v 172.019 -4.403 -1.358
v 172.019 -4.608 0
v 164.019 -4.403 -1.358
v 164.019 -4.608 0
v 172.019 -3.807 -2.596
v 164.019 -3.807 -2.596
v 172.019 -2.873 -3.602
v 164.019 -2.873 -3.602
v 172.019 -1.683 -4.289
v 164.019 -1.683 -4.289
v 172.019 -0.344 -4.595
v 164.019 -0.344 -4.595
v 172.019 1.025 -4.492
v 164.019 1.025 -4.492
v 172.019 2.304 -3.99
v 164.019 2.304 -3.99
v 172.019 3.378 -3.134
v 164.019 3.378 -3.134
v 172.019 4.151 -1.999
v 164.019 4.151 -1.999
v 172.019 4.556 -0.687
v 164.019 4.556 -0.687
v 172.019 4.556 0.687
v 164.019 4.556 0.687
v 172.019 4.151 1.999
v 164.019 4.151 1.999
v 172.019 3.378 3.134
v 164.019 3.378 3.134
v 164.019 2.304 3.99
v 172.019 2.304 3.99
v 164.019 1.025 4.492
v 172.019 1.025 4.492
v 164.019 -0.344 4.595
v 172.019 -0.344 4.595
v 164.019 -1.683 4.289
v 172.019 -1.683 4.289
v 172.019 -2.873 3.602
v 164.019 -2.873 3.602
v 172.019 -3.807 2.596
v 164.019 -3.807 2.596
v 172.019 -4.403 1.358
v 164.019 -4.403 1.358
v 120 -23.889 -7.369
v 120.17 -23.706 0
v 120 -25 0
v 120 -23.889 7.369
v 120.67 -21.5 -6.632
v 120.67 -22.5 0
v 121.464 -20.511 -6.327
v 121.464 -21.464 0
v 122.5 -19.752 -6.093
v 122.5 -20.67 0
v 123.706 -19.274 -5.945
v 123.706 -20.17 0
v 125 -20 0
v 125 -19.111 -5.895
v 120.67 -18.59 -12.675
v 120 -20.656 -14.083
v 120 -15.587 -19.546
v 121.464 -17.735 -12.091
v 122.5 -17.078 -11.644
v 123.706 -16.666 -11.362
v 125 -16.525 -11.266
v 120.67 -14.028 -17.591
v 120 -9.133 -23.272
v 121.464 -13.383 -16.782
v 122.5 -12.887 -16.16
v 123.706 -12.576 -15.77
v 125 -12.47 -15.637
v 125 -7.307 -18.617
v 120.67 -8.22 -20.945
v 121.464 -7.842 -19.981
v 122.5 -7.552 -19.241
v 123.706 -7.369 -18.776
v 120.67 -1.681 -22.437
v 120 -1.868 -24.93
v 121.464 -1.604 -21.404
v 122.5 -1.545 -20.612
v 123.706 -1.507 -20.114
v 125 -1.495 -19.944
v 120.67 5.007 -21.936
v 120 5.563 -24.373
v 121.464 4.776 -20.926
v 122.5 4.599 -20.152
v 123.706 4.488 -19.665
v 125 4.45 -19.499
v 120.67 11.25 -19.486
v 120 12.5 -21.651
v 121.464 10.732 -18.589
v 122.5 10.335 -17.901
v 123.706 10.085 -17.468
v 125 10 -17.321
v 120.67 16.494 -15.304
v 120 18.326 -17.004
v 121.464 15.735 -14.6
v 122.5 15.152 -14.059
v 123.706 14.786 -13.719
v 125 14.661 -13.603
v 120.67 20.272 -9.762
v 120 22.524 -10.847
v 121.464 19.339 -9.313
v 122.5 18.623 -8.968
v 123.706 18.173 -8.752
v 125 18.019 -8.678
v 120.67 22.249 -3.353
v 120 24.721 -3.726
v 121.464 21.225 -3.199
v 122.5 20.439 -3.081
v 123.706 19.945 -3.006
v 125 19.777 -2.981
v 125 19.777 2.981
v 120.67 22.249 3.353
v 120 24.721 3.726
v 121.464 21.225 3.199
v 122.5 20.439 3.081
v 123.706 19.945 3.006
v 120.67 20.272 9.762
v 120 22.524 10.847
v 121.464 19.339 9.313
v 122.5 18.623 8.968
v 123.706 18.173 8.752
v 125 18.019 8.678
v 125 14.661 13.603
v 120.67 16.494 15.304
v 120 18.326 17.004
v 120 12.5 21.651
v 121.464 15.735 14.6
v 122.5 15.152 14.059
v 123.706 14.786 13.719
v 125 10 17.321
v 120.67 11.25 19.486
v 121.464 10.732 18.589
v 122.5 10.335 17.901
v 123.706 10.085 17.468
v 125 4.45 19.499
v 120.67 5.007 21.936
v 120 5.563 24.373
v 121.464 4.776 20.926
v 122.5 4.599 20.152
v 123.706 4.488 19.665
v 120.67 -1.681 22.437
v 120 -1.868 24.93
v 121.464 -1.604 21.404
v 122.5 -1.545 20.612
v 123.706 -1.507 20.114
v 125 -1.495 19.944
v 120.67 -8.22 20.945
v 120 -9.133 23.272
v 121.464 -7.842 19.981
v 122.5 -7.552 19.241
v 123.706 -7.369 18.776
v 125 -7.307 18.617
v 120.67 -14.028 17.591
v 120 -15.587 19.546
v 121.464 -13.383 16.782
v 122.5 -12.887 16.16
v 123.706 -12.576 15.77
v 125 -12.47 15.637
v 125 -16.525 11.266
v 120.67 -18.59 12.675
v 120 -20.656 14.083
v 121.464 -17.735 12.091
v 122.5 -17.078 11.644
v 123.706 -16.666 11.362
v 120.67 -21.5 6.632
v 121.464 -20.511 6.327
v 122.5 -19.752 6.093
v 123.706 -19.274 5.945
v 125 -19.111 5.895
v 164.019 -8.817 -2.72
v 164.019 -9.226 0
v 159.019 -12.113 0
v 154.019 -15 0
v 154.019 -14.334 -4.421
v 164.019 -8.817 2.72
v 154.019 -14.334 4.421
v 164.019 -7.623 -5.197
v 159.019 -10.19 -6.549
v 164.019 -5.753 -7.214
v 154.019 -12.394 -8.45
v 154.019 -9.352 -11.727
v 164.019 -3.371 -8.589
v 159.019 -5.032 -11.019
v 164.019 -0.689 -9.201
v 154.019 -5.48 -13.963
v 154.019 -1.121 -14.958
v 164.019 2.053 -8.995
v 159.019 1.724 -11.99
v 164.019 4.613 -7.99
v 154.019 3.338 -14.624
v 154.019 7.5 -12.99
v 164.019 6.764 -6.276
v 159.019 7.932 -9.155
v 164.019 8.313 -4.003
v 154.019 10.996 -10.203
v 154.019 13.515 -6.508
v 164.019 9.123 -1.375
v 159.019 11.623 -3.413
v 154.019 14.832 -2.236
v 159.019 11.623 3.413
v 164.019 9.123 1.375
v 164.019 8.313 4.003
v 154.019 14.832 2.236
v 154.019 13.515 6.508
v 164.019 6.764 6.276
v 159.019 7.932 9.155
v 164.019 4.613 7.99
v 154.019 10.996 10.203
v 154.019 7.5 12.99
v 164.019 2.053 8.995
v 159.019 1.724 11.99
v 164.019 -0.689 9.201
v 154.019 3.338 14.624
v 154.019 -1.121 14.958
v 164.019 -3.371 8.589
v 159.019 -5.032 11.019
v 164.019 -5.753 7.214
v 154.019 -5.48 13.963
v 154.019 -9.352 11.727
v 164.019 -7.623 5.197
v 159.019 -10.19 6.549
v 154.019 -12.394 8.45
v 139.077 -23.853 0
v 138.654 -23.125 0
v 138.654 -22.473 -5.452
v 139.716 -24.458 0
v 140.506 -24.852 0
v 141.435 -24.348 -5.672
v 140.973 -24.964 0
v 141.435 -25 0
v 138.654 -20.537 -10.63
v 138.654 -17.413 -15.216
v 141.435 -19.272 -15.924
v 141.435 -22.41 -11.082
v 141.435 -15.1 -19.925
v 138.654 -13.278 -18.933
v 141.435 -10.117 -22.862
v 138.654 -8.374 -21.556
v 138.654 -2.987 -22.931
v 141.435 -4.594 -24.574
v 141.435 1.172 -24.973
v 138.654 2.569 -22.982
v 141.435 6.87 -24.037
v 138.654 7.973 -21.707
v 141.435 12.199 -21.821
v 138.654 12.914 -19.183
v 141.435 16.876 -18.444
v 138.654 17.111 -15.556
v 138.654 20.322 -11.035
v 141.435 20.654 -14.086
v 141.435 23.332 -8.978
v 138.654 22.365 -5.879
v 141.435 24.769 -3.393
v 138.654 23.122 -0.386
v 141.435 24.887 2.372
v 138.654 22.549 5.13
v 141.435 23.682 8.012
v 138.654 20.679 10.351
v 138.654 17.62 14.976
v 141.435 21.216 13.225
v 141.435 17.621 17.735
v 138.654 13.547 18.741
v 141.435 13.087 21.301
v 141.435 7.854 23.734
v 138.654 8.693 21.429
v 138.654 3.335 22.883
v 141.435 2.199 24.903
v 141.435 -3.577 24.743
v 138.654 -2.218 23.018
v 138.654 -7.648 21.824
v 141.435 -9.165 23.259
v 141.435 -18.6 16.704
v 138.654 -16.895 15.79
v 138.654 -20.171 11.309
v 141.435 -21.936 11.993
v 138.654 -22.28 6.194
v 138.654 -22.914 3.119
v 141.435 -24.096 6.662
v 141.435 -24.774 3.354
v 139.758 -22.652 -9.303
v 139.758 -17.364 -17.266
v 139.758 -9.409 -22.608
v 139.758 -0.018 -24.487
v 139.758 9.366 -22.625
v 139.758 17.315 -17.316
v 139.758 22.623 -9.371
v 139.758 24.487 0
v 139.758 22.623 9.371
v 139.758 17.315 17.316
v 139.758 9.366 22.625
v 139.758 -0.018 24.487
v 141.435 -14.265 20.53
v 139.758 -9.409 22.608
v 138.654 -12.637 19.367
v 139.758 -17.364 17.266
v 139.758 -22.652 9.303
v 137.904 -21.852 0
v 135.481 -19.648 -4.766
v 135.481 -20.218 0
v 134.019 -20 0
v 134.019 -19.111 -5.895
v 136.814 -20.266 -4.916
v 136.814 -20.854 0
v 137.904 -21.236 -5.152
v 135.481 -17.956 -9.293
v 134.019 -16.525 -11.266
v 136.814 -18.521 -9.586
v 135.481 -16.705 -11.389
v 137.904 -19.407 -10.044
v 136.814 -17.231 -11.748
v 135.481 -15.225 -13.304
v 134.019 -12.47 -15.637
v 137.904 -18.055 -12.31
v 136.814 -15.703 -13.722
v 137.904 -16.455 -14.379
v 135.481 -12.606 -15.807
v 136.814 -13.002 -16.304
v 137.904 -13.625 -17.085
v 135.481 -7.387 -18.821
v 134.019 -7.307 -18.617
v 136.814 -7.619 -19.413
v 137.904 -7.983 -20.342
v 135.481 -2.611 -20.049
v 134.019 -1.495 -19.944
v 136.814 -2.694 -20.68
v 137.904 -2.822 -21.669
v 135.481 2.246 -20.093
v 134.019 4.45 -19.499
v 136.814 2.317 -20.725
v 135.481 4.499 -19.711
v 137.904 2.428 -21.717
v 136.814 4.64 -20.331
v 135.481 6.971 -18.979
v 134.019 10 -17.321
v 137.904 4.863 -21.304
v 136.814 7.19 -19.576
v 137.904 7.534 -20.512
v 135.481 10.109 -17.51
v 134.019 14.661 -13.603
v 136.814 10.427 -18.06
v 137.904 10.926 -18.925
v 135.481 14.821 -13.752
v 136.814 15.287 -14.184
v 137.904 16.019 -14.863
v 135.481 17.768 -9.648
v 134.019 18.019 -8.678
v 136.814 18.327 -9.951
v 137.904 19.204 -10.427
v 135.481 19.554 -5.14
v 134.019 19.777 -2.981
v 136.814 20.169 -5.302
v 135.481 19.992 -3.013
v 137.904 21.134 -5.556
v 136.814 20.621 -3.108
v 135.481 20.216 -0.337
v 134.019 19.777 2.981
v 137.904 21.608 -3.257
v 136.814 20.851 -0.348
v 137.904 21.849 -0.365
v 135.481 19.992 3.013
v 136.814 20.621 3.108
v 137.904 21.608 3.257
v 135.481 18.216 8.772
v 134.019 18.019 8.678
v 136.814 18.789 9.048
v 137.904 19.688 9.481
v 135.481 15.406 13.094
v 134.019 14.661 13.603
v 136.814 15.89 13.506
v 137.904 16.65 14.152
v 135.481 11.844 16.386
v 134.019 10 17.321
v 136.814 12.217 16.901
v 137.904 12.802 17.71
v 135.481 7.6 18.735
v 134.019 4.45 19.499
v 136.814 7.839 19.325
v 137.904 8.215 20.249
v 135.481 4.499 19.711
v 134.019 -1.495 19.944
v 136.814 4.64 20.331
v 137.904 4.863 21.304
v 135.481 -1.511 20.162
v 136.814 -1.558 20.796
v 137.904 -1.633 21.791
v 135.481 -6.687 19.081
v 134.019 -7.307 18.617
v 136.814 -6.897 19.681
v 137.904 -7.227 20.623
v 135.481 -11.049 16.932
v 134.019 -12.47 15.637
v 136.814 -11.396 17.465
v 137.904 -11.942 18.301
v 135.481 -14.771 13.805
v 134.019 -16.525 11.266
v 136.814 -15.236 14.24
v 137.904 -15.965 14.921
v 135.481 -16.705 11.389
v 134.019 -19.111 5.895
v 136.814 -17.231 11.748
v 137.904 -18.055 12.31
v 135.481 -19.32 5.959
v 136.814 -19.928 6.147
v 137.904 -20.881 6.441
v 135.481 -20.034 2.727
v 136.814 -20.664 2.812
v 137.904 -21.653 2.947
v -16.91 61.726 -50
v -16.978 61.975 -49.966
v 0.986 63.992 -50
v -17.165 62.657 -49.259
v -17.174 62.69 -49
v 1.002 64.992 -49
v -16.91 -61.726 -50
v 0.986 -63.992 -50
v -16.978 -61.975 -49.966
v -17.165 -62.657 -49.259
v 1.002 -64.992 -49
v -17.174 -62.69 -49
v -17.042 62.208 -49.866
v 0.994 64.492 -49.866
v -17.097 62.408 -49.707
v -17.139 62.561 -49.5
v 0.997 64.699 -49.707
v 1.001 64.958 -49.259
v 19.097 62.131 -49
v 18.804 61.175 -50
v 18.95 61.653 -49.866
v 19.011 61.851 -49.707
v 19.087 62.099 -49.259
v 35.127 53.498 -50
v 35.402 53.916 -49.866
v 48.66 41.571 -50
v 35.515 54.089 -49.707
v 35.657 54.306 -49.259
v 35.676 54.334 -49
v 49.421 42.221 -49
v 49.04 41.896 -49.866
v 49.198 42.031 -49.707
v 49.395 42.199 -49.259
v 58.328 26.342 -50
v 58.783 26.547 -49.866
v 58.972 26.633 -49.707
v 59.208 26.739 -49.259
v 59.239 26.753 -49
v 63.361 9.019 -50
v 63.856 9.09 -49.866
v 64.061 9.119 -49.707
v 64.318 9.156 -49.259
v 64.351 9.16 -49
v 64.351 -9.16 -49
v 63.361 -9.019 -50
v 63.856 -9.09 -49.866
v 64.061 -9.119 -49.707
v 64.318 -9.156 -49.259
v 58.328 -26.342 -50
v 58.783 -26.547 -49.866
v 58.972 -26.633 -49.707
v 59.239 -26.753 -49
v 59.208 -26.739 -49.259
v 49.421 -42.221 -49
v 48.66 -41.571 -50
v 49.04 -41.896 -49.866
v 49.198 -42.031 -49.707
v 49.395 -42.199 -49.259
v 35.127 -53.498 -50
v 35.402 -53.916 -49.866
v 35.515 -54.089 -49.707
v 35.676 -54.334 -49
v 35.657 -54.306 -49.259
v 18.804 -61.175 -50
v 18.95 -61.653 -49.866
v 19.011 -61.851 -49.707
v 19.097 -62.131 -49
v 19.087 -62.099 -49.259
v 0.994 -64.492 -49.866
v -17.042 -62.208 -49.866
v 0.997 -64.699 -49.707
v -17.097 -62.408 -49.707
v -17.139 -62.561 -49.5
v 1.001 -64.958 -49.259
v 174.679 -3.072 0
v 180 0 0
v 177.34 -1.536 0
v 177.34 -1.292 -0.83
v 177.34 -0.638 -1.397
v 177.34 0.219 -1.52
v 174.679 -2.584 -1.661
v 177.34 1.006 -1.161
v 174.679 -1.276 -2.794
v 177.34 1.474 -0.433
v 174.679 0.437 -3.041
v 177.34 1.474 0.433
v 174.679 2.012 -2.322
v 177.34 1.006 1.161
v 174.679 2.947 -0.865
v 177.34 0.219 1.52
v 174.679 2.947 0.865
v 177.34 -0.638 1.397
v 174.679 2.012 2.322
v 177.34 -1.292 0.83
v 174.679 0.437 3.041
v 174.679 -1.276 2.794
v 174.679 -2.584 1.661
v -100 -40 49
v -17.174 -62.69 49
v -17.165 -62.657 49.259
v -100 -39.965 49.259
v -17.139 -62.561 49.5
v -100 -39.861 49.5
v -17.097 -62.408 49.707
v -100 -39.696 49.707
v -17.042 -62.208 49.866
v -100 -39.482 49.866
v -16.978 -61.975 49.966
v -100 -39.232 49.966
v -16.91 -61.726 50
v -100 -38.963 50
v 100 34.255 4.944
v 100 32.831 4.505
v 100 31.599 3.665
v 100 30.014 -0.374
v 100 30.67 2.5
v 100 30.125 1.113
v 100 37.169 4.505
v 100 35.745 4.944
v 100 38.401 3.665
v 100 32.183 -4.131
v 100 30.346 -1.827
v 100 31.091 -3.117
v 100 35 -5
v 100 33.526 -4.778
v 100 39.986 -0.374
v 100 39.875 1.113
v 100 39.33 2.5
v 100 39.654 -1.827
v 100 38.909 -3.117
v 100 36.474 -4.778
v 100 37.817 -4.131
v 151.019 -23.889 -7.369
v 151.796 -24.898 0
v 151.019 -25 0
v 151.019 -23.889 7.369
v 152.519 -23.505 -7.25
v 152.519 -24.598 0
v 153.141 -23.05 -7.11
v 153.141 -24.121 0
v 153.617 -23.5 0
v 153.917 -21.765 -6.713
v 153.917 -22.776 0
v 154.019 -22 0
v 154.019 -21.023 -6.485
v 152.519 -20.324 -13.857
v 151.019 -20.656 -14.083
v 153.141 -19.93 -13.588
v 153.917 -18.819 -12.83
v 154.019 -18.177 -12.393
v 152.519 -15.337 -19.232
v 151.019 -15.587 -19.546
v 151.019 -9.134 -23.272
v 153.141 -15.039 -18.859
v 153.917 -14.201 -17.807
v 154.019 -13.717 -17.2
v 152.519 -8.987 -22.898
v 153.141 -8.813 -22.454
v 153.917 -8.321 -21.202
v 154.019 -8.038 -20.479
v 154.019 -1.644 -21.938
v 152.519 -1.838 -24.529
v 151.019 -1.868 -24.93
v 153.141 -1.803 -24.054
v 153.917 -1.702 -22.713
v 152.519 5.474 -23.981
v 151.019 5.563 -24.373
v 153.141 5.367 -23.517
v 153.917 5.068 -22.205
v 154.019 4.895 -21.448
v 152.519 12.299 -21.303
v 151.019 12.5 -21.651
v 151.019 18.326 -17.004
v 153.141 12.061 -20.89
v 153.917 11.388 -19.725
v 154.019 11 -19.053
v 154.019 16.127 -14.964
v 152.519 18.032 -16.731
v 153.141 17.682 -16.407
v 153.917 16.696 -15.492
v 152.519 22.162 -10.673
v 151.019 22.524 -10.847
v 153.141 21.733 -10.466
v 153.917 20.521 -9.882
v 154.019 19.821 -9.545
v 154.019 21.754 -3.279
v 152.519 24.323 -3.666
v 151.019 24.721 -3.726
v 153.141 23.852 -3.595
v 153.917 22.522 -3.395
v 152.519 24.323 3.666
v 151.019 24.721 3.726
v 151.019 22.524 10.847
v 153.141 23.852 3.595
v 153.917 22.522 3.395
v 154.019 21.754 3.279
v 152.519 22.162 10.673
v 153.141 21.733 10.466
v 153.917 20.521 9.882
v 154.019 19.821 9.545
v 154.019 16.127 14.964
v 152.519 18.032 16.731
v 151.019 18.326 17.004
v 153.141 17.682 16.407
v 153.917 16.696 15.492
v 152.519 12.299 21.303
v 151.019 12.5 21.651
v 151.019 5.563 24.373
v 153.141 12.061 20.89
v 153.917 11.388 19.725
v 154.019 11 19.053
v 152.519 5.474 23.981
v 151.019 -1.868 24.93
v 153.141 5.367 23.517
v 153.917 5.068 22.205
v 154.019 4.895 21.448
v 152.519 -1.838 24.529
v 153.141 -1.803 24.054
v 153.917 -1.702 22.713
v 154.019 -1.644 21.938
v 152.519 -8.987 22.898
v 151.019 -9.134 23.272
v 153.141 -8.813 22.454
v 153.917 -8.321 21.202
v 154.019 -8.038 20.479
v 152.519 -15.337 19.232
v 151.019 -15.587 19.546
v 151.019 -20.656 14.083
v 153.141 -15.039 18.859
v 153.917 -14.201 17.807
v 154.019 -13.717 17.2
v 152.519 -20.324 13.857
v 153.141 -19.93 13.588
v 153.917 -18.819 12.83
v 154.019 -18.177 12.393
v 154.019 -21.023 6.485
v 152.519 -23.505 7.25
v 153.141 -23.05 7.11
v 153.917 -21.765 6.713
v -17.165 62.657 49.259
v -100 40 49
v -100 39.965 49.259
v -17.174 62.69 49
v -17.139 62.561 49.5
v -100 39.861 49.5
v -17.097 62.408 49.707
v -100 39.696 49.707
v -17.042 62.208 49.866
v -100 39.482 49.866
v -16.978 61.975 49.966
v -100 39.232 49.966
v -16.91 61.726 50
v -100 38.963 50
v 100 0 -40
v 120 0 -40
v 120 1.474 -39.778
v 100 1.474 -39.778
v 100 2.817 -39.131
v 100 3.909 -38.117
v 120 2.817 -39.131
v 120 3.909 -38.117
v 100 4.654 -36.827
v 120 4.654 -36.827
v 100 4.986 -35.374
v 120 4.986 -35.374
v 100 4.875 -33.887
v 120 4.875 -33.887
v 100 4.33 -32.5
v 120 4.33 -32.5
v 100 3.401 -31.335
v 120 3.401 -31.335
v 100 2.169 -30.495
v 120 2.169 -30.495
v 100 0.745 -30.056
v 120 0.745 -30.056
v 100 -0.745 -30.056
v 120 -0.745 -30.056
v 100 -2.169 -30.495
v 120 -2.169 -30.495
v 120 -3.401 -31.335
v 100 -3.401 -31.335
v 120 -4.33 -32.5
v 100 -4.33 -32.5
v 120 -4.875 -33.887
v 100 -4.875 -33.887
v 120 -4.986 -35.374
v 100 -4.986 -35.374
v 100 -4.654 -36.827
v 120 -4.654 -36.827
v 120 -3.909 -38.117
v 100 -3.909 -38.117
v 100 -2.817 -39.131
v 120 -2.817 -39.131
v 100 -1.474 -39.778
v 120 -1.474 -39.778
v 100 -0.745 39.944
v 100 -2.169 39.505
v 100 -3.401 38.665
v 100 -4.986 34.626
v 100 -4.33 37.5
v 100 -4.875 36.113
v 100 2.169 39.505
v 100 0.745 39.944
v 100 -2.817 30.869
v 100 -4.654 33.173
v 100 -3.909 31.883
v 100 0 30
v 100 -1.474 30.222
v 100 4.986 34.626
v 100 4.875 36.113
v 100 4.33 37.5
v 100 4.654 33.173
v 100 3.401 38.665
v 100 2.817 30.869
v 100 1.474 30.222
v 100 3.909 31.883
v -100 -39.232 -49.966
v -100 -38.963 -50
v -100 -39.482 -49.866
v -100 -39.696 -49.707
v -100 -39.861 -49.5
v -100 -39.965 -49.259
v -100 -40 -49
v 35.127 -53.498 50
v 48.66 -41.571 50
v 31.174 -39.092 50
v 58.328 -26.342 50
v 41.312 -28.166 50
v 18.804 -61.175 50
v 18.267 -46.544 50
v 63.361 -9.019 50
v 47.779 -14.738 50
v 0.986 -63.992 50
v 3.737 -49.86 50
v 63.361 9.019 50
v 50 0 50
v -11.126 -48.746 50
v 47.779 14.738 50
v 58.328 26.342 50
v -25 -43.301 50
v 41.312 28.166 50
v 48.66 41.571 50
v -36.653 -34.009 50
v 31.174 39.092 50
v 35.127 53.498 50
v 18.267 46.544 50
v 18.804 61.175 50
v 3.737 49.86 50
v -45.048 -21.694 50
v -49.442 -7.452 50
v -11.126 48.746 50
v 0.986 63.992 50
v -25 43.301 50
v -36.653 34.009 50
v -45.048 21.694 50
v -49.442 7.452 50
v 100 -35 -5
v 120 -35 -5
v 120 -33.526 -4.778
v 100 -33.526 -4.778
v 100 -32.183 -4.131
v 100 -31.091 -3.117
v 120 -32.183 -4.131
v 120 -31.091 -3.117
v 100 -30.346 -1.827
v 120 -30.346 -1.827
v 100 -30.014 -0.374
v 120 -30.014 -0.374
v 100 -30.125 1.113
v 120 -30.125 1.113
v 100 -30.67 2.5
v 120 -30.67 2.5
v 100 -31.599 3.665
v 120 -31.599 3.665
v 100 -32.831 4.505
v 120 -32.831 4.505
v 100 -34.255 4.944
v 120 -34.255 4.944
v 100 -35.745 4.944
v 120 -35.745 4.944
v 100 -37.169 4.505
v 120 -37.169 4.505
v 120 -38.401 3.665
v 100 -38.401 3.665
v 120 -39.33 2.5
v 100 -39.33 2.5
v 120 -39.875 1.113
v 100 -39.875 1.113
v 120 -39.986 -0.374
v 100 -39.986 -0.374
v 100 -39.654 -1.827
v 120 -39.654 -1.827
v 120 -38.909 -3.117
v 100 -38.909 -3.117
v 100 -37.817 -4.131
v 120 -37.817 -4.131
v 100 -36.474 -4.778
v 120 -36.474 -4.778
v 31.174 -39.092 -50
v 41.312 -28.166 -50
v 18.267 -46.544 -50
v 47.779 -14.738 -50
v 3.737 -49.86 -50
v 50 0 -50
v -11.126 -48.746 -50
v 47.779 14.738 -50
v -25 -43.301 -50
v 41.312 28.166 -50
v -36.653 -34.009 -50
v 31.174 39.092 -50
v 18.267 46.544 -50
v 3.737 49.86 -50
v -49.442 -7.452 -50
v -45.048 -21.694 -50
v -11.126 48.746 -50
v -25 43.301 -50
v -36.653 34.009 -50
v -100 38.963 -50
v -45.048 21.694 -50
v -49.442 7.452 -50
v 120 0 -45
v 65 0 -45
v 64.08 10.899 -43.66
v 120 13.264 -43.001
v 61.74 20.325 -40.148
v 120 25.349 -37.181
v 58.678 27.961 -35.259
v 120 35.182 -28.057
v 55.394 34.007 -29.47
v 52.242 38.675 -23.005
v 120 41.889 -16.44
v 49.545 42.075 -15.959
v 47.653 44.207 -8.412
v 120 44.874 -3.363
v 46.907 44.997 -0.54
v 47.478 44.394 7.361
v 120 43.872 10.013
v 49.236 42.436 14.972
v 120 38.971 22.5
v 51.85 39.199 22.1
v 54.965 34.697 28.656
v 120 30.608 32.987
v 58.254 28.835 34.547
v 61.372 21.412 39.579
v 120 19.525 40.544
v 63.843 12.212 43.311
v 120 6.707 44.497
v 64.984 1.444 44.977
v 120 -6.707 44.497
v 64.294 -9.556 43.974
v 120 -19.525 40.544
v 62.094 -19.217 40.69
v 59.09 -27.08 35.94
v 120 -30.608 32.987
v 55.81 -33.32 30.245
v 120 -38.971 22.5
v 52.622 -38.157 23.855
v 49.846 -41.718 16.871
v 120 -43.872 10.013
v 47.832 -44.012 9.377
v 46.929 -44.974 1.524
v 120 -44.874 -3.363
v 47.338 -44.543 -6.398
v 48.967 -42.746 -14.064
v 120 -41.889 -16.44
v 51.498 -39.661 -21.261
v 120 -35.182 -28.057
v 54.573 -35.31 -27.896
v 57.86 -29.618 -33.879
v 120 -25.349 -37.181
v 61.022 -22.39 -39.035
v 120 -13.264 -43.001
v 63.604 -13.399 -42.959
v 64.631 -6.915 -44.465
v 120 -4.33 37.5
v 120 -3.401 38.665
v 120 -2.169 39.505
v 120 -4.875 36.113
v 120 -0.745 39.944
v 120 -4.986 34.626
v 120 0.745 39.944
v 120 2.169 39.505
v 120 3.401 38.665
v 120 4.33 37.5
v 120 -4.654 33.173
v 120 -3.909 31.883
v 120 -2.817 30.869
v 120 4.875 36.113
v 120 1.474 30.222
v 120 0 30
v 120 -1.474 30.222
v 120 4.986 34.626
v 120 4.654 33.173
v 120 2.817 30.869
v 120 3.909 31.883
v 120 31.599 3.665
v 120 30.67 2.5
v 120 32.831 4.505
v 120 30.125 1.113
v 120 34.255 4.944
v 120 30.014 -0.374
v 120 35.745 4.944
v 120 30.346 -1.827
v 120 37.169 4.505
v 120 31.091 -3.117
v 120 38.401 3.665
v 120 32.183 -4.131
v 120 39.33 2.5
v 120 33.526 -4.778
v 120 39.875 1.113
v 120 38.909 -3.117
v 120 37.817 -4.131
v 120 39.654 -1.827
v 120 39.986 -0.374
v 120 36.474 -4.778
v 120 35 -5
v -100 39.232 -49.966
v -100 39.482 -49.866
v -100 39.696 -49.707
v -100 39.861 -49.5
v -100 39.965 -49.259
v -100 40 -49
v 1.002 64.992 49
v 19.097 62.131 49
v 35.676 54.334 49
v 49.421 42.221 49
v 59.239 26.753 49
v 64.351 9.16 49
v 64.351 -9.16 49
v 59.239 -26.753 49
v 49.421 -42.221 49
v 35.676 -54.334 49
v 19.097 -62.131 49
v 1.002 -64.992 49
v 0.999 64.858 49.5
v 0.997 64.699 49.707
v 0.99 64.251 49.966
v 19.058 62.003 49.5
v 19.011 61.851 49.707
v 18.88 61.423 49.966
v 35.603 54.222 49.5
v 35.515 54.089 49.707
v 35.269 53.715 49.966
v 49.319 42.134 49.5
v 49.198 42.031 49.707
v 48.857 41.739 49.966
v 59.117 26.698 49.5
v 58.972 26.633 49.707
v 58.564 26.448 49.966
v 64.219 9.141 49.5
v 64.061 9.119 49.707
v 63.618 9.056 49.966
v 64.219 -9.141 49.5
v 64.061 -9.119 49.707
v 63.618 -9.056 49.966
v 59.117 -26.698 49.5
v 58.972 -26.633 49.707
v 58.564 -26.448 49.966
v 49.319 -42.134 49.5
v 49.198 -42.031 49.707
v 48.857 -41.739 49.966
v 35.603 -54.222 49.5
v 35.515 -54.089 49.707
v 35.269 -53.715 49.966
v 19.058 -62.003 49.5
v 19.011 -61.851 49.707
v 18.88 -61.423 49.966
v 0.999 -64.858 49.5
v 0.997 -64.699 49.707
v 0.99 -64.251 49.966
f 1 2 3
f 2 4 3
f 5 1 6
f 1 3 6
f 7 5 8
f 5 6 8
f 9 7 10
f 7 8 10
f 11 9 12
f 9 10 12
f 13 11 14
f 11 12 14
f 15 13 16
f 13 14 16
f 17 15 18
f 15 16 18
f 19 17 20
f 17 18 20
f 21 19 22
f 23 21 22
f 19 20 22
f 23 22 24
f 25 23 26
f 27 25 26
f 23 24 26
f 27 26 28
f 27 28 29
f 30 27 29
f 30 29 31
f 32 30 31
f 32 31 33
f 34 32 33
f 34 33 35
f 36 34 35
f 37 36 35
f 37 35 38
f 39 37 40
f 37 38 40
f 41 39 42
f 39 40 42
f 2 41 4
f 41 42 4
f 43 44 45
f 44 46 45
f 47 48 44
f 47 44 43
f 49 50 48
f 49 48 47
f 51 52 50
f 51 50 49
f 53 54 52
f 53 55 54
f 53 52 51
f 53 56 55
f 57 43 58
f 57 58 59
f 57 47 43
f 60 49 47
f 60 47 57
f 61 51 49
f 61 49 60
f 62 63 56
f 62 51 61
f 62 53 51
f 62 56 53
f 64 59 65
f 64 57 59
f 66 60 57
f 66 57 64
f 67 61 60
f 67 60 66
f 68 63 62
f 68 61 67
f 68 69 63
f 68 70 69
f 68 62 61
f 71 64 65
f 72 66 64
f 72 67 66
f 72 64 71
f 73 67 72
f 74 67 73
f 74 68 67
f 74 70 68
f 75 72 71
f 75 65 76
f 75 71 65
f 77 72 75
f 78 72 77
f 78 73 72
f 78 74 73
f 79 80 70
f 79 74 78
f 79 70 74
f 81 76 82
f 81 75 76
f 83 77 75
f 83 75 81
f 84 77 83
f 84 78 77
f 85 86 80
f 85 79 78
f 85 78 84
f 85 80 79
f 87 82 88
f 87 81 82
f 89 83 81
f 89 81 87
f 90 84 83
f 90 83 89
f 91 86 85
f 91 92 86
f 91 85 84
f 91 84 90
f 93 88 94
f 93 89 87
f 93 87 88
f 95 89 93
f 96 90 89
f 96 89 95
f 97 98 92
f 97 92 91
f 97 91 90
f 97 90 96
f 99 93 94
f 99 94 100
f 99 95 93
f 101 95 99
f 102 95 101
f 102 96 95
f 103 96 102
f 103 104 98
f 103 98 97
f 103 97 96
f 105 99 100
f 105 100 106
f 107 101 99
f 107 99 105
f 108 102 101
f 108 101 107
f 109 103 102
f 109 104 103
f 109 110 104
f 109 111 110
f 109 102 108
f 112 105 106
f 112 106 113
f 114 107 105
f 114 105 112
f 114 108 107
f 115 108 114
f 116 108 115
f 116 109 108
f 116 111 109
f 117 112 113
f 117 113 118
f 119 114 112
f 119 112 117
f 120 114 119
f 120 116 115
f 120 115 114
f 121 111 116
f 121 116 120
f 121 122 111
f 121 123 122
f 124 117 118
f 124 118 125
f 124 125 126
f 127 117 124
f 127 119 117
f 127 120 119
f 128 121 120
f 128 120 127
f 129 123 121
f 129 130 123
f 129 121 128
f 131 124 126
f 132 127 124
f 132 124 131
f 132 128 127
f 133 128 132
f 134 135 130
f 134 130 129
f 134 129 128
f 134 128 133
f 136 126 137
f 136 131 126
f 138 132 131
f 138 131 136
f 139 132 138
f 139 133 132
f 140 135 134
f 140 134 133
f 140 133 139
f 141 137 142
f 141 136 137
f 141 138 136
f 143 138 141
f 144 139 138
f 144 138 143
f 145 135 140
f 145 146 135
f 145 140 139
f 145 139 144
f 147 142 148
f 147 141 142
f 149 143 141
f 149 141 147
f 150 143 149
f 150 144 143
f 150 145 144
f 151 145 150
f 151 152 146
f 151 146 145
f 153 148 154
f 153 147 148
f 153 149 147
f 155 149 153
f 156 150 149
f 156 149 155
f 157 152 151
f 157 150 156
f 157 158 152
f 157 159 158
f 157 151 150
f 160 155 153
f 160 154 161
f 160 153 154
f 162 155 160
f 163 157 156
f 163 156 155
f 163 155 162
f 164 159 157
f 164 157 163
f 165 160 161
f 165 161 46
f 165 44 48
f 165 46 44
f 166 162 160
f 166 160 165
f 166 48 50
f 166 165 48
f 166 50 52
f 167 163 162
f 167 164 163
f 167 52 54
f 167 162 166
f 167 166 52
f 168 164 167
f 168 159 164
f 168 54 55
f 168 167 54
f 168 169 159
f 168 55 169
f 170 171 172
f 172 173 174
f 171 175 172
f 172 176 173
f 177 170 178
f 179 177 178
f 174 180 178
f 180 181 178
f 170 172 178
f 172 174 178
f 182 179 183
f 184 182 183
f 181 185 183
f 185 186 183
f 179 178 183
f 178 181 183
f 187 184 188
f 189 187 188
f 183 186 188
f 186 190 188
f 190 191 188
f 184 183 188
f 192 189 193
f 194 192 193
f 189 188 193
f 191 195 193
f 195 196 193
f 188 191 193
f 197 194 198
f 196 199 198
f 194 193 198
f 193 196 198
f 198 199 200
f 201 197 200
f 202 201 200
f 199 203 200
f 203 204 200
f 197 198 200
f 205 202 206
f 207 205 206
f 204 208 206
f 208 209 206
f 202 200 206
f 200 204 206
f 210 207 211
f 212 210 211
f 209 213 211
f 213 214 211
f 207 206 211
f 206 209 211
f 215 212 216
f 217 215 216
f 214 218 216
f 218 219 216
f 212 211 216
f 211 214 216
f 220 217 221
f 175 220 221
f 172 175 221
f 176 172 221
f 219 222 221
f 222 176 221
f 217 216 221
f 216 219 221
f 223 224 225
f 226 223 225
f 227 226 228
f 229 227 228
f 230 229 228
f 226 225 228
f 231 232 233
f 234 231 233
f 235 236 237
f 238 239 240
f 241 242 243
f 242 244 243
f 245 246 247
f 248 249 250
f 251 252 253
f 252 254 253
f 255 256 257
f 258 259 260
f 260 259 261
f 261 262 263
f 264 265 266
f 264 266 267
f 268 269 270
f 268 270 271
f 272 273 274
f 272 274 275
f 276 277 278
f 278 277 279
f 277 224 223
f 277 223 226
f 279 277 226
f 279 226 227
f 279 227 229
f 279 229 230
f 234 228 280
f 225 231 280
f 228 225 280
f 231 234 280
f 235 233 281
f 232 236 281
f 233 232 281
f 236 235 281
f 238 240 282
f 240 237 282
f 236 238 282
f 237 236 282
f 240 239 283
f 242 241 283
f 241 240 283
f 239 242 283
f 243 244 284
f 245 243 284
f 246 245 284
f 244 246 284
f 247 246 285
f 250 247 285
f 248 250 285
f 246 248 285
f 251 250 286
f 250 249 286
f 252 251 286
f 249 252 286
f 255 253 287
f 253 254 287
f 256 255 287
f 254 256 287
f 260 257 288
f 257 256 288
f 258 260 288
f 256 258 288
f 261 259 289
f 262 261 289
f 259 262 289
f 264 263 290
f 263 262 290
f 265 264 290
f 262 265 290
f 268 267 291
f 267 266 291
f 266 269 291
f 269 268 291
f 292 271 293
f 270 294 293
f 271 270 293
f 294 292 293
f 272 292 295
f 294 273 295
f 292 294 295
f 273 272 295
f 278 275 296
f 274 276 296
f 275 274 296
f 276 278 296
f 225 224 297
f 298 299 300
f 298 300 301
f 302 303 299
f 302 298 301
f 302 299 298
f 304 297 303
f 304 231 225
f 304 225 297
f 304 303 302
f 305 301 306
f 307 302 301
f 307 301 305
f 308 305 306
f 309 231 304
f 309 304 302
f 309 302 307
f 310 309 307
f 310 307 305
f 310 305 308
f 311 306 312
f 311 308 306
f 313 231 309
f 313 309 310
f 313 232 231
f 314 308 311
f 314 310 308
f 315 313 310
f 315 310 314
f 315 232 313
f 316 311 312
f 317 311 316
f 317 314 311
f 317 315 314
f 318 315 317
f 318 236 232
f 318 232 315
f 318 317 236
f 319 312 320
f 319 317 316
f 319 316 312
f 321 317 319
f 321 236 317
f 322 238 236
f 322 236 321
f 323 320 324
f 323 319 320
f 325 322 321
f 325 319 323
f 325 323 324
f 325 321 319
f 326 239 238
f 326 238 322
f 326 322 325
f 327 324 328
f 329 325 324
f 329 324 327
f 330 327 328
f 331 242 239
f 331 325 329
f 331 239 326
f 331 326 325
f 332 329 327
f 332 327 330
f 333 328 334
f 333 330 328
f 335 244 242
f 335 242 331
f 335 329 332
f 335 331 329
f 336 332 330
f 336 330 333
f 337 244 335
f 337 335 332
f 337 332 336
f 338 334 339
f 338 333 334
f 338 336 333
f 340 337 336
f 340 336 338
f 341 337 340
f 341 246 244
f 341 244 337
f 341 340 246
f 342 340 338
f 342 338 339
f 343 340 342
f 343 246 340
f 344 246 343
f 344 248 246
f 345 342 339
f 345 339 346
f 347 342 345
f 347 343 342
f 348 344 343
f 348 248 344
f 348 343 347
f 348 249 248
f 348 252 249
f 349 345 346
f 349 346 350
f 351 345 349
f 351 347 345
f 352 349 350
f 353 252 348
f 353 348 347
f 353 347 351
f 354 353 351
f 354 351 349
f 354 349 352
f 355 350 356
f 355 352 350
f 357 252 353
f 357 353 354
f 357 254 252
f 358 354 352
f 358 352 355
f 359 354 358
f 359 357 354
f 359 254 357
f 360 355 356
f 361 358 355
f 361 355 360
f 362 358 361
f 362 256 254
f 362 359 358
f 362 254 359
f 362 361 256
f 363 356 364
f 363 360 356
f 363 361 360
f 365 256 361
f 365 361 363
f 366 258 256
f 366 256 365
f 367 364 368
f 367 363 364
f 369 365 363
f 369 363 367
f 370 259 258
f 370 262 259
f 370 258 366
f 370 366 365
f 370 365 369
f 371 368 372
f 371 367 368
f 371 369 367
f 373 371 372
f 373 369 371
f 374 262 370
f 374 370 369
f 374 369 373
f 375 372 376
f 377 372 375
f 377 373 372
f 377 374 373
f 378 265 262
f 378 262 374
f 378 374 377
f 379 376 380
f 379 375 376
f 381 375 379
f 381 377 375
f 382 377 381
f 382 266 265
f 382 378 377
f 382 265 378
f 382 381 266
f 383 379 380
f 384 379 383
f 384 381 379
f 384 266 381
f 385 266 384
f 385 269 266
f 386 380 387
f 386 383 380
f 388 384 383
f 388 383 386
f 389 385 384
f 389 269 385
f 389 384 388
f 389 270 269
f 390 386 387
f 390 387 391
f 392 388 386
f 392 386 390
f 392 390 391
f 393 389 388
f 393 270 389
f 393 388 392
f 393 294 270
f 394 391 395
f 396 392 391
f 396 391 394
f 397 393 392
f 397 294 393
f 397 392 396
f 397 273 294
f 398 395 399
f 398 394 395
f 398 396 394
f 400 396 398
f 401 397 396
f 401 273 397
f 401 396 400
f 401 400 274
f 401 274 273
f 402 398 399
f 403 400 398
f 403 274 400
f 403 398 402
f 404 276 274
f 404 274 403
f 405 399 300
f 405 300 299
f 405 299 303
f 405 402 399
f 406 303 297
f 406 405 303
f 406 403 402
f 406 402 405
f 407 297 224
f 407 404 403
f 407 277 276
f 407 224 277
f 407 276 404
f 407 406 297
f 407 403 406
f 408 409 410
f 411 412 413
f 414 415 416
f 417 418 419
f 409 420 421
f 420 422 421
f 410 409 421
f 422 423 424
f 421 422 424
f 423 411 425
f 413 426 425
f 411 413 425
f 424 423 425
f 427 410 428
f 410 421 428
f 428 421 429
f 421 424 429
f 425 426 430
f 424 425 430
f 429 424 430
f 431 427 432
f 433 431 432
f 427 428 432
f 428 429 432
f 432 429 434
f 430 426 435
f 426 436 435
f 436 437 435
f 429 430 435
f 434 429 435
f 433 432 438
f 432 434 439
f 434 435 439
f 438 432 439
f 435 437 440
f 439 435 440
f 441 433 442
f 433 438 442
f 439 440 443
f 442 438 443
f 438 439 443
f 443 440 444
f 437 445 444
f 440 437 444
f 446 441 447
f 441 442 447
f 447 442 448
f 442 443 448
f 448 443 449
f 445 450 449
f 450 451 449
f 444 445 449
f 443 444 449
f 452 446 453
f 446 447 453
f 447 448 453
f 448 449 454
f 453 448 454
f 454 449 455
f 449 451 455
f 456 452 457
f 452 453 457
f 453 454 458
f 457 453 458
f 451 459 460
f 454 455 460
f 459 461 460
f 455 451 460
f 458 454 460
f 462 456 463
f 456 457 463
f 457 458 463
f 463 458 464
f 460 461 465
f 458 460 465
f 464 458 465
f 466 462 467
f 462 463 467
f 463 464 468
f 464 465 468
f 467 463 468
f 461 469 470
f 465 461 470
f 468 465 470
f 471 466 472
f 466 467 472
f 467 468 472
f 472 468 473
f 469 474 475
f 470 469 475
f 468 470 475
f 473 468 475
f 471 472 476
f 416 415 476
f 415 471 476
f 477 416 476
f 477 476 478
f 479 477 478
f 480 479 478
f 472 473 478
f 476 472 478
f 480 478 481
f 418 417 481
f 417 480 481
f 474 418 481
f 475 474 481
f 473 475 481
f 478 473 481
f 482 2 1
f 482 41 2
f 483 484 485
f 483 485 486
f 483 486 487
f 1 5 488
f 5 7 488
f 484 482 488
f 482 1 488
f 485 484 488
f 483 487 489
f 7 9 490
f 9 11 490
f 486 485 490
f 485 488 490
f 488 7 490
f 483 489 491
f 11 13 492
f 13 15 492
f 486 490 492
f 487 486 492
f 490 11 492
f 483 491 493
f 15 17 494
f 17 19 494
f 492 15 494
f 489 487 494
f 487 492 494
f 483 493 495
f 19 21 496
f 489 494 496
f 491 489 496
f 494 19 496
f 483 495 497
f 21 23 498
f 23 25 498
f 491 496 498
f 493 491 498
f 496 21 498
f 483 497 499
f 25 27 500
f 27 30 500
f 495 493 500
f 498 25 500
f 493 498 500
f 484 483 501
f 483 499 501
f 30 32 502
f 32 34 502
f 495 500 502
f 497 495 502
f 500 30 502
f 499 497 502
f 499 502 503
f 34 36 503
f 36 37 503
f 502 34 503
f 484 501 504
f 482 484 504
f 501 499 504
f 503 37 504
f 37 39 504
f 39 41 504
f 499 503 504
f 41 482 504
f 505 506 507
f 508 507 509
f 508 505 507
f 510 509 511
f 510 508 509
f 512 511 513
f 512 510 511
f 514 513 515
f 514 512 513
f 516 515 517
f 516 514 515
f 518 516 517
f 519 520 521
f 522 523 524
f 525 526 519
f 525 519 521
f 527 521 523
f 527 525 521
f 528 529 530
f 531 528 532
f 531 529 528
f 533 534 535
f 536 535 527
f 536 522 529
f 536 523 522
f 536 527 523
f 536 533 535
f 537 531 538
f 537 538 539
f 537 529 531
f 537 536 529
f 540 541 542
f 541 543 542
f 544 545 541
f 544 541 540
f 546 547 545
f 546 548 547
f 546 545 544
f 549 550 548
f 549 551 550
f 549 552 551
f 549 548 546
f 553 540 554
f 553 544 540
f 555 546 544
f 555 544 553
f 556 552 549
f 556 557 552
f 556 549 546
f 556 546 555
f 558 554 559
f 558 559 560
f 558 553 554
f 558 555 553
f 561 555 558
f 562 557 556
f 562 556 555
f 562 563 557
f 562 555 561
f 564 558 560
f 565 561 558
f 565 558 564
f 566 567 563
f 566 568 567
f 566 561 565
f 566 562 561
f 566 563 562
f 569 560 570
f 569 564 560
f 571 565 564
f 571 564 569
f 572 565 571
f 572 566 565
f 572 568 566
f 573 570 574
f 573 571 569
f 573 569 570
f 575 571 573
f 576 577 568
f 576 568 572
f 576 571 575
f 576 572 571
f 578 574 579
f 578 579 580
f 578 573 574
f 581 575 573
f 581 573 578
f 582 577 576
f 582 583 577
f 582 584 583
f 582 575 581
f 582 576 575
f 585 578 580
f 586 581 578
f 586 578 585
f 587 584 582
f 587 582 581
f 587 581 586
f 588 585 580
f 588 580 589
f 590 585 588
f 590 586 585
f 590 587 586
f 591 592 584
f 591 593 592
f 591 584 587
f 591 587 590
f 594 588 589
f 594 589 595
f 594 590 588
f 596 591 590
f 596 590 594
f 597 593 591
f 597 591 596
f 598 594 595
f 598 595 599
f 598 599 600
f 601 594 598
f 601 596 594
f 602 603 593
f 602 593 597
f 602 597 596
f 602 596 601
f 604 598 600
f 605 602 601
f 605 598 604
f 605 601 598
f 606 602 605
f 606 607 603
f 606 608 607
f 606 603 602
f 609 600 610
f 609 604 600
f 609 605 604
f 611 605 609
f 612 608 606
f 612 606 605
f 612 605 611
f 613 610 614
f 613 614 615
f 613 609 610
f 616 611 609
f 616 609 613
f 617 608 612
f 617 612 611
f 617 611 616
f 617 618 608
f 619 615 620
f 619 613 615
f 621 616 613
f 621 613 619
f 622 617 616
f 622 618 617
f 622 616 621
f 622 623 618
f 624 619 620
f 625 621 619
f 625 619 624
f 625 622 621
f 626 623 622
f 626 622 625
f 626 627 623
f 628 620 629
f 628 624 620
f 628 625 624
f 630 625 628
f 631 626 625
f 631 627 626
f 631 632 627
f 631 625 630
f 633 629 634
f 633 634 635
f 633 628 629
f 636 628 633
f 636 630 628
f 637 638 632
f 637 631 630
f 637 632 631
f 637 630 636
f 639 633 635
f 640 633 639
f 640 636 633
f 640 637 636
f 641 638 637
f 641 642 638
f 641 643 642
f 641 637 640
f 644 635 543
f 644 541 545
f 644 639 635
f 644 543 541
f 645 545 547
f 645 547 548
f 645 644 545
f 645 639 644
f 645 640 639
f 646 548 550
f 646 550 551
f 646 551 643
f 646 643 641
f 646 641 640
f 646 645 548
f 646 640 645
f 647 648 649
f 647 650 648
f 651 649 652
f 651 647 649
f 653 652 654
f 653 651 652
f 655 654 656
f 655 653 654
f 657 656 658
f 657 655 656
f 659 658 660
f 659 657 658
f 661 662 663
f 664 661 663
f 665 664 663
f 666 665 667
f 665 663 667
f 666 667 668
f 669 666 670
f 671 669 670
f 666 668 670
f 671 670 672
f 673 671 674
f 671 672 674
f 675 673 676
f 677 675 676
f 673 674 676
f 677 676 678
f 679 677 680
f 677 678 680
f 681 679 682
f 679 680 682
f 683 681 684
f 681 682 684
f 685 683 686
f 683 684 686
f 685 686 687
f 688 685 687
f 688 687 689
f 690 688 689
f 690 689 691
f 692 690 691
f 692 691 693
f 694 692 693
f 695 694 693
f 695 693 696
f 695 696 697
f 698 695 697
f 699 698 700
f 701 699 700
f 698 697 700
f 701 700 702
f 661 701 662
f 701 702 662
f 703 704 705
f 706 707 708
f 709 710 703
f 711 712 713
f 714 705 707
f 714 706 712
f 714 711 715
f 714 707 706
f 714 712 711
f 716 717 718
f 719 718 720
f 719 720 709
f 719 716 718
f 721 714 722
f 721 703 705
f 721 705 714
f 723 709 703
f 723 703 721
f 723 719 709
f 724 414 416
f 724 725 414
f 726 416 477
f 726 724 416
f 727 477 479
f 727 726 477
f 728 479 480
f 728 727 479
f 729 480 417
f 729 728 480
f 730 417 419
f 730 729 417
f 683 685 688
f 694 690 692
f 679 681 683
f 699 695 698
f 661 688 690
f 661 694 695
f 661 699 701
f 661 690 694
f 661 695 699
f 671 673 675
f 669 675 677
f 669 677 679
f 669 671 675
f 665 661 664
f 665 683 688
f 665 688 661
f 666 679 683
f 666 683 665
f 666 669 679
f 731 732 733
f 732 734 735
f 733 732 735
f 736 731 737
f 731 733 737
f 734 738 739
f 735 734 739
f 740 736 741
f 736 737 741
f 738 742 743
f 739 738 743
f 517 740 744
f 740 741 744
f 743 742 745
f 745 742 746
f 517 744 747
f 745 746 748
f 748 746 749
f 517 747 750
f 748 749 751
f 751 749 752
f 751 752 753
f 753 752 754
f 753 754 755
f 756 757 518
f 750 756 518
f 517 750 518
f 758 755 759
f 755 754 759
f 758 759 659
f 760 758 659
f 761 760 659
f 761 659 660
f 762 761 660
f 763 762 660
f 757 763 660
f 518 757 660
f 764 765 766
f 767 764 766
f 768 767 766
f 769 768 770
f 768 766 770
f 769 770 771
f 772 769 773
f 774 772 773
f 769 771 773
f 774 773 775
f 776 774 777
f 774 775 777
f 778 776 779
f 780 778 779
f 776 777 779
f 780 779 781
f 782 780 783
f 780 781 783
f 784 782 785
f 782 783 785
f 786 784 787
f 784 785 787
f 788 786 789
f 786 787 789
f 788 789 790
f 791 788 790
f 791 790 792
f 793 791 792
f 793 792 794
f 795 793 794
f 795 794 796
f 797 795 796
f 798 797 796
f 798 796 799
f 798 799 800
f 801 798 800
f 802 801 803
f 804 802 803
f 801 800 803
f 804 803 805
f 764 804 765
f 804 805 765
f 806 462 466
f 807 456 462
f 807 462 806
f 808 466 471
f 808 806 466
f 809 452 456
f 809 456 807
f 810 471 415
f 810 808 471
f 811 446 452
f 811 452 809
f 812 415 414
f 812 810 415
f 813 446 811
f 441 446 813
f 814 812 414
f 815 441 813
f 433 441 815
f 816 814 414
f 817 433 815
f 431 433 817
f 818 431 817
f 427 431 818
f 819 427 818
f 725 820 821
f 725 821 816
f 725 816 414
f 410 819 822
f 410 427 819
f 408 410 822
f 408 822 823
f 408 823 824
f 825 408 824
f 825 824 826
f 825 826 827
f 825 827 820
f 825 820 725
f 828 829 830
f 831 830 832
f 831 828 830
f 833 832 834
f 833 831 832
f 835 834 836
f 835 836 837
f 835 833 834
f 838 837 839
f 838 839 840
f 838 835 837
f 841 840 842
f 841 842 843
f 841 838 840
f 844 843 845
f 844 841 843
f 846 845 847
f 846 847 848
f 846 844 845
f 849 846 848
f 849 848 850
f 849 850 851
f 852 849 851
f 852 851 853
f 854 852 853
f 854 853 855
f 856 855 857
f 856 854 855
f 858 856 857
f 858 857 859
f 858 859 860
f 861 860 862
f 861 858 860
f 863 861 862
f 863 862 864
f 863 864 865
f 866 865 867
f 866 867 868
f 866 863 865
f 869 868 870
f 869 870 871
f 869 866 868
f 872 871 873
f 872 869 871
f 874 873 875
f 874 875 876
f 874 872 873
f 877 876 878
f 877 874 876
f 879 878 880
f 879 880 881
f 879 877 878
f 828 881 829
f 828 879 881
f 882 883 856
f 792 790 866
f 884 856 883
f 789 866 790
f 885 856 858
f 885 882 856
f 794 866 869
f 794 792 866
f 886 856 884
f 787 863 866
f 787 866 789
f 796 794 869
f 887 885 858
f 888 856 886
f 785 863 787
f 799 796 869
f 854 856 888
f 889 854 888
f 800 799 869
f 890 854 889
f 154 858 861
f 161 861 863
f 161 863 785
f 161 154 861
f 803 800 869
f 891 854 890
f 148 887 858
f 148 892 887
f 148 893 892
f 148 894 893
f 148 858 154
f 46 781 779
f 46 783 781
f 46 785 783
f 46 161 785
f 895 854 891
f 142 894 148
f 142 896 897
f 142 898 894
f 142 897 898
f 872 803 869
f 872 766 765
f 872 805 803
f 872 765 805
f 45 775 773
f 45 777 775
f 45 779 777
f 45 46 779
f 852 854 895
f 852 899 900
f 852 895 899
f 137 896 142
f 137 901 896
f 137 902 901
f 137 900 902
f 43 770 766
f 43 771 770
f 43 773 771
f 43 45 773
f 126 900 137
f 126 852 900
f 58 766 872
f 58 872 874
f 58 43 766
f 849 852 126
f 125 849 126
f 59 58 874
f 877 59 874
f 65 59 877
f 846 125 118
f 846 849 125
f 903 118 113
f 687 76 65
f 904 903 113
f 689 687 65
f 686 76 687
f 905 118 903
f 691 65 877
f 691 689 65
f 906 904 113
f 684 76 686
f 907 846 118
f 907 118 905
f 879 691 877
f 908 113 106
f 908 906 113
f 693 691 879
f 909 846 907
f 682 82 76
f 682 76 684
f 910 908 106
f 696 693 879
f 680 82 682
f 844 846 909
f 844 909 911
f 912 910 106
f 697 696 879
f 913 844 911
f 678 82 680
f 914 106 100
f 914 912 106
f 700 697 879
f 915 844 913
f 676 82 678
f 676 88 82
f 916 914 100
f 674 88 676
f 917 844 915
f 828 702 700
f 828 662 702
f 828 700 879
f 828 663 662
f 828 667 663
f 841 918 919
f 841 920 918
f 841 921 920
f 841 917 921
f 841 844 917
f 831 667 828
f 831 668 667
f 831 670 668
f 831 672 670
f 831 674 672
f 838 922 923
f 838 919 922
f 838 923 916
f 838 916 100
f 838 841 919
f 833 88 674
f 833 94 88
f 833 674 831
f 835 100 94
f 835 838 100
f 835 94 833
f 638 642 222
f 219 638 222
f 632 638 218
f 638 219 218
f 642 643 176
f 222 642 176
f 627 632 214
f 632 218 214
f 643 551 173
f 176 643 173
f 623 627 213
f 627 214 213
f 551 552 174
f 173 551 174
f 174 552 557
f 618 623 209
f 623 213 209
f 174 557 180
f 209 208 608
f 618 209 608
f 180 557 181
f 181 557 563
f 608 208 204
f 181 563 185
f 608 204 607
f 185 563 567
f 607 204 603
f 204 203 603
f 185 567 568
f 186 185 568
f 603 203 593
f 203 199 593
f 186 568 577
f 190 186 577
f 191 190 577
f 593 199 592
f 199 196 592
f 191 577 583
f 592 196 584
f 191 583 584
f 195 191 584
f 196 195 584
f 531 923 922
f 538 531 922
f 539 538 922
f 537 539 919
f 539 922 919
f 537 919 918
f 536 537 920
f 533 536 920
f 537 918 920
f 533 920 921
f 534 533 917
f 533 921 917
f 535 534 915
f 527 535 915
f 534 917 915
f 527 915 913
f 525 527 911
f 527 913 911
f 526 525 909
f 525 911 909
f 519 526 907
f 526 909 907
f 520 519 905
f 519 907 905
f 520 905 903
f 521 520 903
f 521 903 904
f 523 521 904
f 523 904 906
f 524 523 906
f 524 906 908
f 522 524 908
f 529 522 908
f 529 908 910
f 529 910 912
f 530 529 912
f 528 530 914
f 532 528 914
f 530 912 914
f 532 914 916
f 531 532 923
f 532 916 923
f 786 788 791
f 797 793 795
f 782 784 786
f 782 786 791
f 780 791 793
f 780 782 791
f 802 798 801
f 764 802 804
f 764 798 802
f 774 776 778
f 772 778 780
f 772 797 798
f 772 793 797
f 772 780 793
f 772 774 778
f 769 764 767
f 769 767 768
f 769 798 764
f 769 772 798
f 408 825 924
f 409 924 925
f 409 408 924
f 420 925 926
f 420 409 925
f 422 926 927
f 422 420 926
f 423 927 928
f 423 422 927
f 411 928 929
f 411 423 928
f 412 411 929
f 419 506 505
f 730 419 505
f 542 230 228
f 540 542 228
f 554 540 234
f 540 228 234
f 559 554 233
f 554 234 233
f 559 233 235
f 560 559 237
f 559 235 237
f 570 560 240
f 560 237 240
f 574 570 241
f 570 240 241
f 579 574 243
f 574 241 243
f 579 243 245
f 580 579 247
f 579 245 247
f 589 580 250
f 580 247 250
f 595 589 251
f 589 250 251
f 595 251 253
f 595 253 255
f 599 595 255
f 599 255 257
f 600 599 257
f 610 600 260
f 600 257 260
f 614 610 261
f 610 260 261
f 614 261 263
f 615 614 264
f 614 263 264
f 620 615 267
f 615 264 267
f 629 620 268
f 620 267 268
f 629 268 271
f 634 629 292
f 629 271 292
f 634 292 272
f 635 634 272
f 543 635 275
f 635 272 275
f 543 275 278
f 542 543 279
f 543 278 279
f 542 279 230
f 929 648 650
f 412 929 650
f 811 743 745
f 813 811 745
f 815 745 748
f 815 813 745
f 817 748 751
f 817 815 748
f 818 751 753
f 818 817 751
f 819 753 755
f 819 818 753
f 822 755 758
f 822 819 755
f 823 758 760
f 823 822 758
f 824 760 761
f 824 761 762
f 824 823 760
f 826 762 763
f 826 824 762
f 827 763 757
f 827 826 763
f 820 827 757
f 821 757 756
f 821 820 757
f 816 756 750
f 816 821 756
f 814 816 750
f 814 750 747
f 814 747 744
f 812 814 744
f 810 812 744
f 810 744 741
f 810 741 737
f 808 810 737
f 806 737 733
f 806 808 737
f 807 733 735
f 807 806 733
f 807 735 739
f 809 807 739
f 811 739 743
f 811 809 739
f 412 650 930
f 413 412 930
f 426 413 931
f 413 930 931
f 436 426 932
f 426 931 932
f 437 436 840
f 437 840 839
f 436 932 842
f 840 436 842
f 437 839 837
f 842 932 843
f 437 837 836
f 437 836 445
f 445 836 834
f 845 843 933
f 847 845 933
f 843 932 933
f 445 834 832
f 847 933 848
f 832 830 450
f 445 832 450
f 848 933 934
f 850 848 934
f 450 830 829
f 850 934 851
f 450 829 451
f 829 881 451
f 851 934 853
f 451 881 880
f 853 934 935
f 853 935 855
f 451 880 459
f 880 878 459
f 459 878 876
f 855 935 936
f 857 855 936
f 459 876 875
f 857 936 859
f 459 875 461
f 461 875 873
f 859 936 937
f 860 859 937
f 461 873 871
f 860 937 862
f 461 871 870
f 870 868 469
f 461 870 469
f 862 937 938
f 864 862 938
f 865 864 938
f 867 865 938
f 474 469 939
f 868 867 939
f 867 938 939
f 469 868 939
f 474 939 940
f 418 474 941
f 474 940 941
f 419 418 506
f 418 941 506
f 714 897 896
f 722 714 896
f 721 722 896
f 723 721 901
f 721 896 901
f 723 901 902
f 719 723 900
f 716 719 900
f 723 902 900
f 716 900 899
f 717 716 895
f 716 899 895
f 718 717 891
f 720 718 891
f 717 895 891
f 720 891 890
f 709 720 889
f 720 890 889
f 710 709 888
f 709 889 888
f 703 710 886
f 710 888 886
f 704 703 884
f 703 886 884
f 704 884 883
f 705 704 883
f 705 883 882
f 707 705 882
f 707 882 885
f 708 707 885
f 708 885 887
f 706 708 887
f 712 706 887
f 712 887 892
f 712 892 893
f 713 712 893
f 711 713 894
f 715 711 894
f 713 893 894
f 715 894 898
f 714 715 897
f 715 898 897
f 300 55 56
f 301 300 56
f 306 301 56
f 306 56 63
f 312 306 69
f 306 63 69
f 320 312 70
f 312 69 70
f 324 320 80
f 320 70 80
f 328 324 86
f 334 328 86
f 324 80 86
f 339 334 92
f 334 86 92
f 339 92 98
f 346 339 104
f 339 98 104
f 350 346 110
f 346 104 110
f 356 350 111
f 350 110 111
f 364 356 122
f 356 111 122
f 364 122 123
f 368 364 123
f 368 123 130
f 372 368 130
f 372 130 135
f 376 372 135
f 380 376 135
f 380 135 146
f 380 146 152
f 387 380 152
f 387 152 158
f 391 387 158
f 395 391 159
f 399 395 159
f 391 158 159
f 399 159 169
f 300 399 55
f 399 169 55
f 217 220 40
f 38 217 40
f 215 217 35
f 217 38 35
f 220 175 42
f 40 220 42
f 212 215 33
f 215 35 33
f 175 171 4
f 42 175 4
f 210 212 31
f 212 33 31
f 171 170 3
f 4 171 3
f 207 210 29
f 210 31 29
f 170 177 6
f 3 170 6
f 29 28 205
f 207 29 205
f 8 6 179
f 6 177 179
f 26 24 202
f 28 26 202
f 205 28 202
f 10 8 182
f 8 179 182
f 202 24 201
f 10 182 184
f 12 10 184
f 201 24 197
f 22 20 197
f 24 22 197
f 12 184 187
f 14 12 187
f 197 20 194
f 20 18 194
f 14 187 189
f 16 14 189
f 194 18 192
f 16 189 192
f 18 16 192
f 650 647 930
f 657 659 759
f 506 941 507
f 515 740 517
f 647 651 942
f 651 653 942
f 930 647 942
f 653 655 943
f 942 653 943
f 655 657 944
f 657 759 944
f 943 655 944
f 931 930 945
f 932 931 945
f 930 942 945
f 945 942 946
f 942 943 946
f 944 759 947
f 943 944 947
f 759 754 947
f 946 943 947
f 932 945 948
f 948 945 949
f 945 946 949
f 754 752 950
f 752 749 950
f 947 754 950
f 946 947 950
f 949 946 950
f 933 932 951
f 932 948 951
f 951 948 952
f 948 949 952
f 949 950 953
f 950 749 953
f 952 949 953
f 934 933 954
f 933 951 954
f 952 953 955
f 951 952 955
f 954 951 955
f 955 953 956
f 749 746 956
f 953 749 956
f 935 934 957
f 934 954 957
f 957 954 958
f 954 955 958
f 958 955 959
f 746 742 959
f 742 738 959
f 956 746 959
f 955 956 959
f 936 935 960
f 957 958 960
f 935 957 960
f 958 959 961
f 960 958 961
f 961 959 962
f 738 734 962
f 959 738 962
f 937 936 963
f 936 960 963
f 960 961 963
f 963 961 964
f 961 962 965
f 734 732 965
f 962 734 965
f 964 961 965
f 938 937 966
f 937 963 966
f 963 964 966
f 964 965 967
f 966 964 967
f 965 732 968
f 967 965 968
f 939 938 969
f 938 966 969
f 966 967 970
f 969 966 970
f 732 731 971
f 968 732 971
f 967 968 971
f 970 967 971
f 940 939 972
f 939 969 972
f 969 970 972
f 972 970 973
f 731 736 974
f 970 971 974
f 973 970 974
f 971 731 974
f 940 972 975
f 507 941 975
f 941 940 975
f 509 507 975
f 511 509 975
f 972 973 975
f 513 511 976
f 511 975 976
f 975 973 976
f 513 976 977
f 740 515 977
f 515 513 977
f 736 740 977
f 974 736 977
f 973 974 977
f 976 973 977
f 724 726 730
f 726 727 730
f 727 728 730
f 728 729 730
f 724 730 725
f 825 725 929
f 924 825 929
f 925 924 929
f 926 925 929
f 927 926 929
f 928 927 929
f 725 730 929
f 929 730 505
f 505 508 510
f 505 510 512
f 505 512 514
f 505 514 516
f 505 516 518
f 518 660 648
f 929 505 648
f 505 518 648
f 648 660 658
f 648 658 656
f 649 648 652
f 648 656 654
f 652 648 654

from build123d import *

# Parameters (mm, degrees)
SKETCH1_R                = 50
BOSS_EXTRUDE1_DEPTH      = 50
BOSS_EXTRUDE2_REACH      = 251.325
BOSS_EXTRUDE2_END_RADIUS = 65
BOSS_EXTRUDE2_START      = 120
SKETCH2_R                = 45
SKETCH4_R                = 5
CUT_EXTRUDE1_DEPTH       = 20
FILLET1_R                = 5
FILLET2_R                = 1
FILLET3_R                = 3


with BuildPart() as part:
    # Sketch1 → Boss-Extrude1 (new, symmetric)
    with BuildSketch(Plane.XY):
        with BuildLine():
            Line((-100, -40), (-100, 40))
            Line((-100, 40), (-17.173936855, 62.690157863))
            ThreePointArc((-17.173936855, 62.690157863), (65, 0), (-17.173936855, -62.690157863))
            Line((-17.173936855, -62.690157863), (-100, -40))
        make_face()
        Circle(SKETCH1_R, mode=Mode.SUBTRACT)
    extrude(amount=BOSS_EXTRUDE1_DEPTH, both=True)

    # Boss-Extrude2: up to this cylinder (the profile starts outside it)
    boss_extrude2_end = Plane(origin=(0, 0, 0), z_dir=(0, 0, -1)) * Cylinder(BOSS_EXTRUDE2_END_RADIUS, 633.65, mode=Mode.PRIVATE)
    # Sketch2 → Boss-Extrude2 (add, up to the surface)
    with BuildSketch(Plane(origin=(0, 0, 0), x_dir=(0, 0, -1), z_dir=(1, 0, 0)).offset(BOSS_EXTRUDE2_START), mode=Mode.PRIVATE) as boss_extrude2_sk1:
        Circle(SKETCH2_R)
    boss_extrude2_tool1 = extrude(boss_extrude2_sk1.sketch, amount=-BOSS_EXTRUDE2_REACH, mode=Mode.PRIVATE) - boss_extrude2_end
    add(boss_extrude2_tool1.solids().sort_by_distance((120, 0, 0))[0])

    # Sketch3 → Revolve1 (revolve)
    with BuildSketch(Plane.XY):
        Polygon((120, 0), (180, 0), (172.019237886, -4.607695155), (164.019237886, -4.607695155), (164.019237886, -9.226497308), (154.019237886, -15), (154.019237886, -25), (139.019237886, -25), (139.019237886, -20), (120, -20), align=None)
    revolve(axis=Axis((0, 0, 0), (1, 0, 0)))

    # Sketch4 → Cut-Extrude1 (cut)
    with BuildSketch(Plane(origin=(120, 0, 0), x_dir=(0, 0, -1), z_dir=(1, 0, 0))):
        with Locations((0, 35)):
            Circle(SKETCH4_R)
        with Locations((35, 0)):
            Circle(SKETCH4_R)
        with Locations((0, -35)):
            Circle(SKETCH4_R)
        with Locations((-35, 0)):
            Circle(SKETCH4_R)
    extrude(amount=-CUT_EXTRUDE1_DEPTH, mode=Mode.SUBTRACT)

    # Fillet1
    fillet1_edges = [part.edges().sort_by_distance(p)[0] for p in [
        (120, 20, 0),
        (139.019237886, 20, 0),
    ]]
    fillet(fillet1_edges, radius=FILLET1_R - 0.0001)  # a hair under: the kernel refuses the full size

    # Fillet2
    fillet2_edges = [part.edges().sort_by_distance(p)[0] for p in [
        (-58.586968427, 51.345078932, 50),
        (-58.586968427, -51.345078932, 50),
        (-58.586968427, 51.345078932, -50),
        (65, 0, -50),
        (-58.586968427, -51.345078932, -50),
        (65, 0, 50),
    ]]
    fillet(fillet2_edges, radius=FILLET2_R)

    # Fillet3
    fillet3_edges = [part.edges().sort_by_distance(p)[0] for p in [
        (154.019237886, 25, 0),
        (139.019237886, 25, 0),
    ]]
    fillet(fillet3_edges, radius=FILLET3_R)


solid = part.part
